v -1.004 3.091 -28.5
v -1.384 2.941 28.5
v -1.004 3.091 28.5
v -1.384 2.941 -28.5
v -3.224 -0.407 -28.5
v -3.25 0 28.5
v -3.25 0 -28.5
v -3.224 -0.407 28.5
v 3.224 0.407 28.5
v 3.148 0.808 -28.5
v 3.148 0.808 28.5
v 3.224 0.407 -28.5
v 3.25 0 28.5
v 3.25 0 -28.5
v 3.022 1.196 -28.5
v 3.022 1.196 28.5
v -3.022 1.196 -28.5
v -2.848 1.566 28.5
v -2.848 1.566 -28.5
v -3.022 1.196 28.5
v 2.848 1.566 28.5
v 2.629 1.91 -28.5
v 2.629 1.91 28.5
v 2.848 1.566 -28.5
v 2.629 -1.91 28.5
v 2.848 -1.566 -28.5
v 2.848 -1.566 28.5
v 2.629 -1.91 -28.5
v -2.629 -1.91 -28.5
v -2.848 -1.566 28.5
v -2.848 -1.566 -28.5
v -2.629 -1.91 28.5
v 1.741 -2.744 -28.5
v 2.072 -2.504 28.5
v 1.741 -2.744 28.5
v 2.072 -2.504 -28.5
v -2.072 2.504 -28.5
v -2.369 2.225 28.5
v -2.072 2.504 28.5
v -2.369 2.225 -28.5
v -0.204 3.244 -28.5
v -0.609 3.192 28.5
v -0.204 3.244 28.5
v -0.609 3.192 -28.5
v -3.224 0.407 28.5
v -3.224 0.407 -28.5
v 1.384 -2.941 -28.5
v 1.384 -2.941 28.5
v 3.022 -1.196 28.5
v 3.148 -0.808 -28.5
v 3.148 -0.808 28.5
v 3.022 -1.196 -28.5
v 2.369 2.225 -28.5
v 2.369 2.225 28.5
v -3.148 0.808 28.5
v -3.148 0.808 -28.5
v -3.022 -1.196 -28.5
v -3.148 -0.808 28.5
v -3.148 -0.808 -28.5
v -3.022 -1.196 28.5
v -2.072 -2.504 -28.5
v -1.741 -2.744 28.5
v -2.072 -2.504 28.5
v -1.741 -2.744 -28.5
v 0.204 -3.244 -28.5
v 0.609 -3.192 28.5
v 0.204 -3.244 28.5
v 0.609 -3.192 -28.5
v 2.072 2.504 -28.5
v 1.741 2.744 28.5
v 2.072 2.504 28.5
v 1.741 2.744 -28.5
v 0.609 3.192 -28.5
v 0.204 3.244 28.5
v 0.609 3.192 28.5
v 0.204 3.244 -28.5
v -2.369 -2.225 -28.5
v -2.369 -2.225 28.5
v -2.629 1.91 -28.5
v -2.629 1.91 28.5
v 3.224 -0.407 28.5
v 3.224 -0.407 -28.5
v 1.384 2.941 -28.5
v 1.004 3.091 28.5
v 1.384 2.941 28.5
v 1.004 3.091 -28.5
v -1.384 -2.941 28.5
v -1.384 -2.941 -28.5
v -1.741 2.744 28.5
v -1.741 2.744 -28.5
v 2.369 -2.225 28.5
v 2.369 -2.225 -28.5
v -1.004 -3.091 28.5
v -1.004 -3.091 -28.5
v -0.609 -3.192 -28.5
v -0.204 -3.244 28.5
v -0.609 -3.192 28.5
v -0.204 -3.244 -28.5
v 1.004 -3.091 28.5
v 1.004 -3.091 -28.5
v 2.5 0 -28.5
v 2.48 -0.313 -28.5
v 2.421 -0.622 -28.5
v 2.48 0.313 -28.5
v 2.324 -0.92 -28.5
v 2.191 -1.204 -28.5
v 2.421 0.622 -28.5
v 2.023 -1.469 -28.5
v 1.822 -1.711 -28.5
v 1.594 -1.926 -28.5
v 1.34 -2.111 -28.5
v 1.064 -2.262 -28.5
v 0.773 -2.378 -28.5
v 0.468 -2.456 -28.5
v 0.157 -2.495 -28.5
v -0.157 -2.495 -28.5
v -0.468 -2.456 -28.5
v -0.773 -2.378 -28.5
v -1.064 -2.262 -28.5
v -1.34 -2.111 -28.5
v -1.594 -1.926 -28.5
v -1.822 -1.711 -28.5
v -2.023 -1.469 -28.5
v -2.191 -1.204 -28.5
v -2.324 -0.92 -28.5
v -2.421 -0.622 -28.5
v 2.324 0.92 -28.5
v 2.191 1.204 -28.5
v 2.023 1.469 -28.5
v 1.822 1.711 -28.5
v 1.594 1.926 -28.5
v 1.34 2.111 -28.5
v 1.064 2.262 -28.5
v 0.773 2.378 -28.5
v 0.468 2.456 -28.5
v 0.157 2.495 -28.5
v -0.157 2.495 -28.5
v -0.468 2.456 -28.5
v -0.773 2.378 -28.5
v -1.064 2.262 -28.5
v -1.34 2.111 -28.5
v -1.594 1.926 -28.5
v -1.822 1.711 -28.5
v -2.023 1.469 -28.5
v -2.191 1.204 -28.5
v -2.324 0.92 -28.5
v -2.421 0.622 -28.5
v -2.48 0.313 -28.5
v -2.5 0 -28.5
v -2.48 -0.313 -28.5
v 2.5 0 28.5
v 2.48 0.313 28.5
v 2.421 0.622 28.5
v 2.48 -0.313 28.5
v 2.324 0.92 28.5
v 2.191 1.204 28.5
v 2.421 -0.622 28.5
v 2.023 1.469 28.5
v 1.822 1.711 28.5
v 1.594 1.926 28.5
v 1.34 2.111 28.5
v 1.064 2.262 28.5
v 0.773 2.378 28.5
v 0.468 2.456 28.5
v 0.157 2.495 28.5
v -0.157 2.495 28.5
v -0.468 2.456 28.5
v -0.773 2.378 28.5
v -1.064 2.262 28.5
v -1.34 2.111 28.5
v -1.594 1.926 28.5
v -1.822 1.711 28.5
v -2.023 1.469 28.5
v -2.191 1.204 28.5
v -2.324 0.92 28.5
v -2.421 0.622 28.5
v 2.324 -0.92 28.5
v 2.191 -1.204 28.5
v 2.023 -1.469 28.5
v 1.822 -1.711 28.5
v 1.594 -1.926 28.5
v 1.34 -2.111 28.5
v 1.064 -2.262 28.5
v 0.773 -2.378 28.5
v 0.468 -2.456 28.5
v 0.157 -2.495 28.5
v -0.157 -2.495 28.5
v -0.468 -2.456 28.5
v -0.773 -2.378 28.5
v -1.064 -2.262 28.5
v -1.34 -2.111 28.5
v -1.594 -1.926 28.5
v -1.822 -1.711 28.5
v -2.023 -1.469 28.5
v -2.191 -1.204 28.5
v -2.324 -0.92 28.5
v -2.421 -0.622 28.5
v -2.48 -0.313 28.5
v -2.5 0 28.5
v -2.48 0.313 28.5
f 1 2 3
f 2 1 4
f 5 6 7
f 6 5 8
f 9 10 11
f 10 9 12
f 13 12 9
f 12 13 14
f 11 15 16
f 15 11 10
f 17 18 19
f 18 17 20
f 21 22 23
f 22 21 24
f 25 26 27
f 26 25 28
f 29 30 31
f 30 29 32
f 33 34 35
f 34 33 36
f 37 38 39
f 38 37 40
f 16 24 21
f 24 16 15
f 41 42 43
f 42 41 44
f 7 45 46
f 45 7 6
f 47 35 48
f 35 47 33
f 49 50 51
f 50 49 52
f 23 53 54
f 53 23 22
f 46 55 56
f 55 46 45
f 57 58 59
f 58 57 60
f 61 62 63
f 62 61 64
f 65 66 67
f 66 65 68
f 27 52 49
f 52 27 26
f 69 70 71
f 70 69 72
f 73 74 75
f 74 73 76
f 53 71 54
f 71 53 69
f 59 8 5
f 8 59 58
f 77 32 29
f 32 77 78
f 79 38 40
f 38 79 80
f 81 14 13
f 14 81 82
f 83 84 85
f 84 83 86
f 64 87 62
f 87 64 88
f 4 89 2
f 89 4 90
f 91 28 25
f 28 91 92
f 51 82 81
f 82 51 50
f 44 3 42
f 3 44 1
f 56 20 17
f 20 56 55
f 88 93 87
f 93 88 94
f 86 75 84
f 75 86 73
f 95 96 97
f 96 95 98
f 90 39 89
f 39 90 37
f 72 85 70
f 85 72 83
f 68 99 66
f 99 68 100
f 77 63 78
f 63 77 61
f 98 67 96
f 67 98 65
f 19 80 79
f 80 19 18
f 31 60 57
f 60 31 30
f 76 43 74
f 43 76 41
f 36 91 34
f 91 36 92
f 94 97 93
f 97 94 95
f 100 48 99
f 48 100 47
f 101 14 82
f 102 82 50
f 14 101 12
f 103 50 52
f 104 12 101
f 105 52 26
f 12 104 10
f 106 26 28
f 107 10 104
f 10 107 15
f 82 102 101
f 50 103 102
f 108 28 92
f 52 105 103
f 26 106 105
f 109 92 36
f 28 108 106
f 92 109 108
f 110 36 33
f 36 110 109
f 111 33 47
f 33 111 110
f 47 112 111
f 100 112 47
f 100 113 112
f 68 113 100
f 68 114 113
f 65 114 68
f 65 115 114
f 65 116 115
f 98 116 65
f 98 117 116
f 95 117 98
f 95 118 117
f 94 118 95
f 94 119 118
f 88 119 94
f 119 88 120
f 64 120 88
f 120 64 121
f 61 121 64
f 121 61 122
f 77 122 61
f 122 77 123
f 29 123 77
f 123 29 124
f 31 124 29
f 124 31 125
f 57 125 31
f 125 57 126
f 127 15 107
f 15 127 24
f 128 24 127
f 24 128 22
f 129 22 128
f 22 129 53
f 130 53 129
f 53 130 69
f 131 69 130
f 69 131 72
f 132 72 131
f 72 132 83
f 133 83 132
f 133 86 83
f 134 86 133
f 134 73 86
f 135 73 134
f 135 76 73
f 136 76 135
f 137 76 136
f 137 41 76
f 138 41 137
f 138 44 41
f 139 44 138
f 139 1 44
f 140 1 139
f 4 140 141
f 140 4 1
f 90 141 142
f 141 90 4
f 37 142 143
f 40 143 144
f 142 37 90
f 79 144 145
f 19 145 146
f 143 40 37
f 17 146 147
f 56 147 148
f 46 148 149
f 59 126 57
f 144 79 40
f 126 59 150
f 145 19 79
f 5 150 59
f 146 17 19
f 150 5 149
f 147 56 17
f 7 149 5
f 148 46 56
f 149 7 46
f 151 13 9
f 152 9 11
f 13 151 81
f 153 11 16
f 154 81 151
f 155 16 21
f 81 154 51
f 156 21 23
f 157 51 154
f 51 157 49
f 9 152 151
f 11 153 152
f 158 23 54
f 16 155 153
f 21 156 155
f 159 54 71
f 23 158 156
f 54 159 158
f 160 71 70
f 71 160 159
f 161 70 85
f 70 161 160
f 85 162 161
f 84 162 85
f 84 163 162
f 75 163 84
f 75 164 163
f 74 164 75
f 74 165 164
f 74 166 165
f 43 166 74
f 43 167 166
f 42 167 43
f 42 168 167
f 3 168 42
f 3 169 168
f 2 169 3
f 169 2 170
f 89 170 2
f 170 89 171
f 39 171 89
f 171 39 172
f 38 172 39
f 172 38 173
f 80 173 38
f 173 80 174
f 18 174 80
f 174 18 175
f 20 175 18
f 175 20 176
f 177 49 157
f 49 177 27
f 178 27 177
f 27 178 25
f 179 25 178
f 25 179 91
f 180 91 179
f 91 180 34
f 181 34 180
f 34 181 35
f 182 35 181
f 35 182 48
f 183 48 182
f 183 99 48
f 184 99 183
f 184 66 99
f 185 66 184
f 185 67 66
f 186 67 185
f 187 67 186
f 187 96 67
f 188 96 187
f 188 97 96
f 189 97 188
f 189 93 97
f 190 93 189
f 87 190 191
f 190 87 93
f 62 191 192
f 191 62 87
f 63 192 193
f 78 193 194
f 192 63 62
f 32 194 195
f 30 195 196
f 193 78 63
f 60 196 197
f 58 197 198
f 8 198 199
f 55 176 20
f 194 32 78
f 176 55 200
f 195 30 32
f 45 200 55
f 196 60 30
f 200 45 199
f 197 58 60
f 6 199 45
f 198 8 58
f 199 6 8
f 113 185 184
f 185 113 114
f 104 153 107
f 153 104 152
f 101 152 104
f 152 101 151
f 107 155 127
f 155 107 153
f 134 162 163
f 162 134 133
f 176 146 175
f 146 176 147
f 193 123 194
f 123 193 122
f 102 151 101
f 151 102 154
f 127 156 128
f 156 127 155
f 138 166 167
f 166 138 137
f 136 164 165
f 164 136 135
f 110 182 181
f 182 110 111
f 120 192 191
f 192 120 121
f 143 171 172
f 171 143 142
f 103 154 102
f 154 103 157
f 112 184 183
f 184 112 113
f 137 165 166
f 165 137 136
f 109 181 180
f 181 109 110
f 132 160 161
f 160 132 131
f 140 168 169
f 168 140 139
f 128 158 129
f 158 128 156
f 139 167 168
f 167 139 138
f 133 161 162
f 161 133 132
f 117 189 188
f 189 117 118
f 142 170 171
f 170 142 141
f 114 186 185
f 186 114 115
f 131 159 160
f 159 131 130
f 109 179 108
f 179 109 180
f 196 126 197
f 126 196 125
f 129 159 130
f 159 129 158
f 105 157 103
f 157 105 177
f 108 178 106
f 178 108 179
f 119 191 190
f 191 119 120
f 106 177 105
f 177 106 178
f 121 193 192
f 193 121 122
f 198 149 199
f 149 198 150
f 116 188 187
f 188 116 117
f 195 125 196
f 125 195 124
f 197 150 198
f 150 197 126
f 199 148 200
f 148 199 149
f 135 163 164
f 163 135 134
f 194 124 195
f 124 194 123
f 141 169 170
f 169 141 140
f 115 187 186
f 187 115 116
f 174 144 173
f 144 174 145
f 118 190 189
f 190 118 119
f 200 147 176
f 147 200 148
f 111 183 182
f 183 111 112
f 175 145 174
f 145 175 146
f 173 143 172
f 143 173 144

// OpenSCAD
$fn = 50;


difference() {
	union() {
		translate(v = [0, 0, -28.5000000000]) {
			cylinder(h = 57, r = 3.2500000000);
		}
	}
	union() {
		translate(v = [0, 0, -100.0000000000]) {
			cylinder(h = 200, r = 2.5000000000);
		}
	}
}
